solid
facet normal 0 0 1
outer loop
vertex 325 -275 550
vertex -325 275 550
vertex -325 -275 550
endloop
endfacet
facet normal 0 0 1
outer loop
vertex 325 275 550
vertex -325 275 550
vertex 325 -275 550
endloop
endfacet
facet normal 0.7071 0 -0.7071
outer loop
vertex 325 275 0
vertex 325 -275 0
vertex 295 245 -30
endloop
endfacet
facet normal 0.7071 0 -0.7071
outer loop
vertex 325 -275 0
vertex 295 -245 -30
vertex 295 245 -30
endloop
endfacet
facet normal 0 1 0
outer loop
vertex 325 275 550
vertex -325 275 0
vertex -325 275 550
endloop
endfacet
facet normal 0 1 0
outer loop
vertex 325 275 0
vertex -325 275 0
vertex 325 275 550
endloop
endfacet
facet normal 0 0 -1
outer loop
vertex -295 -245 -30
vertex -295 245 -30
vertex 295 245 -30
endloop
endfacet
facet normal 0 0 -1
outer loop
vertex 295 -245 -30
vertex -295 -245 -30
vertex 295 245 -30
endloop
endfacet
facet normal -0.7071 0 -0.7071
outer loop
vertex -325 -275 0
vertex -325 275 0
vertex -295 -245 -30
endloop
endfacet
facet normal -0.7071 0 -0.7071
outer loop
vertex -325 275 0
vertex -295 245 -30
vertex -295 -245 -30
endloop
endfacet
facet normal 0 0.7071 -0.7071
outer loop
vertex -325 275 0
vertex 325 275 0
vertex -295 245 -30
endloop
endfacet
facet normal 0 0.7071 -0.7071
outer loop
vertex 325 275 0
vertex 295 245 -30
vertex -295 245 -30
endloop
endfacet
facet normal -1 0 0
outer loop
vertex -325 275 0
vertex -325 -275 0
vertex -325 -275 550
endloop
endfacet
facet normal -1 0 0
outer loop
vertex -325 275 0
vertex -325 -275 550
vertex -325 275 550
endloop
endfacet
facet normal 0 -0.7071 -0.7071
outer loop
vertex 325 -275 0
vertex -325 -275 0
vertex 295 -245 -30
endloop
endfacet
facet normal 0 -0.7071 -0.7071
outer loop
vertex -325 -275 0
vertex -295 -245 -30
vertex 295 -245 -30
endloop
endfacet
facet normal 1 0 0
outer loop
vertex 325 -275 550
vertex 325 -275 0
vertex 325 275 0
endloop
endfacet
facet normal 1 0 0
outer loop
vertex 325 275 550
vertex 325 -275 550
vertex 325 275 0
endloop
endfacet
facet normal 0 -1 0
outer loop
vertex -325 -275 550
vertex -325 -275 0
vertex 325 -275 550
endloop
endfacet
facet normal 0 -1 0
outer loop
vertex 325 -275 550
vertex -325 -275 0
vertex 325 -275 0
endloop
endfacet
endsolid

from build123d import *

# Parameters (mm, degrees)
SKETCH2_W                     = 650
SKETCH2_H                     = 550
BOSS_EXTRUDE1_DEPTH           = 550
BOSS_EXTRUDE1_OTHER_WAY_DEPTH = 30
BOSS_EXTRUDE1_OTHER_WAY_TAPER = 45


with BuildPart() as part:
    # Sketch2 → Boss-Extrude1 (new body)
    with BuildSketch(Plane.XY):
        Rectangle(SKETCH2_W, SKETCH2_H)
    extrude(amount=BOSS_EXTRUDE1_DEPTH)

    # Sketch2 → Boss-Extrude1 other way (add)
    with BuildSketch(Plane.XY):
        Rectangle(SKETCH2_W, SKETCH2_H)
    extrude(amount=-BOSS_EXTRUDE1_OTHER_WAY_DEPTH, taper=BOSS_EXTRUDE1_OTHER_WAY_TAPER)


solid = part.part
